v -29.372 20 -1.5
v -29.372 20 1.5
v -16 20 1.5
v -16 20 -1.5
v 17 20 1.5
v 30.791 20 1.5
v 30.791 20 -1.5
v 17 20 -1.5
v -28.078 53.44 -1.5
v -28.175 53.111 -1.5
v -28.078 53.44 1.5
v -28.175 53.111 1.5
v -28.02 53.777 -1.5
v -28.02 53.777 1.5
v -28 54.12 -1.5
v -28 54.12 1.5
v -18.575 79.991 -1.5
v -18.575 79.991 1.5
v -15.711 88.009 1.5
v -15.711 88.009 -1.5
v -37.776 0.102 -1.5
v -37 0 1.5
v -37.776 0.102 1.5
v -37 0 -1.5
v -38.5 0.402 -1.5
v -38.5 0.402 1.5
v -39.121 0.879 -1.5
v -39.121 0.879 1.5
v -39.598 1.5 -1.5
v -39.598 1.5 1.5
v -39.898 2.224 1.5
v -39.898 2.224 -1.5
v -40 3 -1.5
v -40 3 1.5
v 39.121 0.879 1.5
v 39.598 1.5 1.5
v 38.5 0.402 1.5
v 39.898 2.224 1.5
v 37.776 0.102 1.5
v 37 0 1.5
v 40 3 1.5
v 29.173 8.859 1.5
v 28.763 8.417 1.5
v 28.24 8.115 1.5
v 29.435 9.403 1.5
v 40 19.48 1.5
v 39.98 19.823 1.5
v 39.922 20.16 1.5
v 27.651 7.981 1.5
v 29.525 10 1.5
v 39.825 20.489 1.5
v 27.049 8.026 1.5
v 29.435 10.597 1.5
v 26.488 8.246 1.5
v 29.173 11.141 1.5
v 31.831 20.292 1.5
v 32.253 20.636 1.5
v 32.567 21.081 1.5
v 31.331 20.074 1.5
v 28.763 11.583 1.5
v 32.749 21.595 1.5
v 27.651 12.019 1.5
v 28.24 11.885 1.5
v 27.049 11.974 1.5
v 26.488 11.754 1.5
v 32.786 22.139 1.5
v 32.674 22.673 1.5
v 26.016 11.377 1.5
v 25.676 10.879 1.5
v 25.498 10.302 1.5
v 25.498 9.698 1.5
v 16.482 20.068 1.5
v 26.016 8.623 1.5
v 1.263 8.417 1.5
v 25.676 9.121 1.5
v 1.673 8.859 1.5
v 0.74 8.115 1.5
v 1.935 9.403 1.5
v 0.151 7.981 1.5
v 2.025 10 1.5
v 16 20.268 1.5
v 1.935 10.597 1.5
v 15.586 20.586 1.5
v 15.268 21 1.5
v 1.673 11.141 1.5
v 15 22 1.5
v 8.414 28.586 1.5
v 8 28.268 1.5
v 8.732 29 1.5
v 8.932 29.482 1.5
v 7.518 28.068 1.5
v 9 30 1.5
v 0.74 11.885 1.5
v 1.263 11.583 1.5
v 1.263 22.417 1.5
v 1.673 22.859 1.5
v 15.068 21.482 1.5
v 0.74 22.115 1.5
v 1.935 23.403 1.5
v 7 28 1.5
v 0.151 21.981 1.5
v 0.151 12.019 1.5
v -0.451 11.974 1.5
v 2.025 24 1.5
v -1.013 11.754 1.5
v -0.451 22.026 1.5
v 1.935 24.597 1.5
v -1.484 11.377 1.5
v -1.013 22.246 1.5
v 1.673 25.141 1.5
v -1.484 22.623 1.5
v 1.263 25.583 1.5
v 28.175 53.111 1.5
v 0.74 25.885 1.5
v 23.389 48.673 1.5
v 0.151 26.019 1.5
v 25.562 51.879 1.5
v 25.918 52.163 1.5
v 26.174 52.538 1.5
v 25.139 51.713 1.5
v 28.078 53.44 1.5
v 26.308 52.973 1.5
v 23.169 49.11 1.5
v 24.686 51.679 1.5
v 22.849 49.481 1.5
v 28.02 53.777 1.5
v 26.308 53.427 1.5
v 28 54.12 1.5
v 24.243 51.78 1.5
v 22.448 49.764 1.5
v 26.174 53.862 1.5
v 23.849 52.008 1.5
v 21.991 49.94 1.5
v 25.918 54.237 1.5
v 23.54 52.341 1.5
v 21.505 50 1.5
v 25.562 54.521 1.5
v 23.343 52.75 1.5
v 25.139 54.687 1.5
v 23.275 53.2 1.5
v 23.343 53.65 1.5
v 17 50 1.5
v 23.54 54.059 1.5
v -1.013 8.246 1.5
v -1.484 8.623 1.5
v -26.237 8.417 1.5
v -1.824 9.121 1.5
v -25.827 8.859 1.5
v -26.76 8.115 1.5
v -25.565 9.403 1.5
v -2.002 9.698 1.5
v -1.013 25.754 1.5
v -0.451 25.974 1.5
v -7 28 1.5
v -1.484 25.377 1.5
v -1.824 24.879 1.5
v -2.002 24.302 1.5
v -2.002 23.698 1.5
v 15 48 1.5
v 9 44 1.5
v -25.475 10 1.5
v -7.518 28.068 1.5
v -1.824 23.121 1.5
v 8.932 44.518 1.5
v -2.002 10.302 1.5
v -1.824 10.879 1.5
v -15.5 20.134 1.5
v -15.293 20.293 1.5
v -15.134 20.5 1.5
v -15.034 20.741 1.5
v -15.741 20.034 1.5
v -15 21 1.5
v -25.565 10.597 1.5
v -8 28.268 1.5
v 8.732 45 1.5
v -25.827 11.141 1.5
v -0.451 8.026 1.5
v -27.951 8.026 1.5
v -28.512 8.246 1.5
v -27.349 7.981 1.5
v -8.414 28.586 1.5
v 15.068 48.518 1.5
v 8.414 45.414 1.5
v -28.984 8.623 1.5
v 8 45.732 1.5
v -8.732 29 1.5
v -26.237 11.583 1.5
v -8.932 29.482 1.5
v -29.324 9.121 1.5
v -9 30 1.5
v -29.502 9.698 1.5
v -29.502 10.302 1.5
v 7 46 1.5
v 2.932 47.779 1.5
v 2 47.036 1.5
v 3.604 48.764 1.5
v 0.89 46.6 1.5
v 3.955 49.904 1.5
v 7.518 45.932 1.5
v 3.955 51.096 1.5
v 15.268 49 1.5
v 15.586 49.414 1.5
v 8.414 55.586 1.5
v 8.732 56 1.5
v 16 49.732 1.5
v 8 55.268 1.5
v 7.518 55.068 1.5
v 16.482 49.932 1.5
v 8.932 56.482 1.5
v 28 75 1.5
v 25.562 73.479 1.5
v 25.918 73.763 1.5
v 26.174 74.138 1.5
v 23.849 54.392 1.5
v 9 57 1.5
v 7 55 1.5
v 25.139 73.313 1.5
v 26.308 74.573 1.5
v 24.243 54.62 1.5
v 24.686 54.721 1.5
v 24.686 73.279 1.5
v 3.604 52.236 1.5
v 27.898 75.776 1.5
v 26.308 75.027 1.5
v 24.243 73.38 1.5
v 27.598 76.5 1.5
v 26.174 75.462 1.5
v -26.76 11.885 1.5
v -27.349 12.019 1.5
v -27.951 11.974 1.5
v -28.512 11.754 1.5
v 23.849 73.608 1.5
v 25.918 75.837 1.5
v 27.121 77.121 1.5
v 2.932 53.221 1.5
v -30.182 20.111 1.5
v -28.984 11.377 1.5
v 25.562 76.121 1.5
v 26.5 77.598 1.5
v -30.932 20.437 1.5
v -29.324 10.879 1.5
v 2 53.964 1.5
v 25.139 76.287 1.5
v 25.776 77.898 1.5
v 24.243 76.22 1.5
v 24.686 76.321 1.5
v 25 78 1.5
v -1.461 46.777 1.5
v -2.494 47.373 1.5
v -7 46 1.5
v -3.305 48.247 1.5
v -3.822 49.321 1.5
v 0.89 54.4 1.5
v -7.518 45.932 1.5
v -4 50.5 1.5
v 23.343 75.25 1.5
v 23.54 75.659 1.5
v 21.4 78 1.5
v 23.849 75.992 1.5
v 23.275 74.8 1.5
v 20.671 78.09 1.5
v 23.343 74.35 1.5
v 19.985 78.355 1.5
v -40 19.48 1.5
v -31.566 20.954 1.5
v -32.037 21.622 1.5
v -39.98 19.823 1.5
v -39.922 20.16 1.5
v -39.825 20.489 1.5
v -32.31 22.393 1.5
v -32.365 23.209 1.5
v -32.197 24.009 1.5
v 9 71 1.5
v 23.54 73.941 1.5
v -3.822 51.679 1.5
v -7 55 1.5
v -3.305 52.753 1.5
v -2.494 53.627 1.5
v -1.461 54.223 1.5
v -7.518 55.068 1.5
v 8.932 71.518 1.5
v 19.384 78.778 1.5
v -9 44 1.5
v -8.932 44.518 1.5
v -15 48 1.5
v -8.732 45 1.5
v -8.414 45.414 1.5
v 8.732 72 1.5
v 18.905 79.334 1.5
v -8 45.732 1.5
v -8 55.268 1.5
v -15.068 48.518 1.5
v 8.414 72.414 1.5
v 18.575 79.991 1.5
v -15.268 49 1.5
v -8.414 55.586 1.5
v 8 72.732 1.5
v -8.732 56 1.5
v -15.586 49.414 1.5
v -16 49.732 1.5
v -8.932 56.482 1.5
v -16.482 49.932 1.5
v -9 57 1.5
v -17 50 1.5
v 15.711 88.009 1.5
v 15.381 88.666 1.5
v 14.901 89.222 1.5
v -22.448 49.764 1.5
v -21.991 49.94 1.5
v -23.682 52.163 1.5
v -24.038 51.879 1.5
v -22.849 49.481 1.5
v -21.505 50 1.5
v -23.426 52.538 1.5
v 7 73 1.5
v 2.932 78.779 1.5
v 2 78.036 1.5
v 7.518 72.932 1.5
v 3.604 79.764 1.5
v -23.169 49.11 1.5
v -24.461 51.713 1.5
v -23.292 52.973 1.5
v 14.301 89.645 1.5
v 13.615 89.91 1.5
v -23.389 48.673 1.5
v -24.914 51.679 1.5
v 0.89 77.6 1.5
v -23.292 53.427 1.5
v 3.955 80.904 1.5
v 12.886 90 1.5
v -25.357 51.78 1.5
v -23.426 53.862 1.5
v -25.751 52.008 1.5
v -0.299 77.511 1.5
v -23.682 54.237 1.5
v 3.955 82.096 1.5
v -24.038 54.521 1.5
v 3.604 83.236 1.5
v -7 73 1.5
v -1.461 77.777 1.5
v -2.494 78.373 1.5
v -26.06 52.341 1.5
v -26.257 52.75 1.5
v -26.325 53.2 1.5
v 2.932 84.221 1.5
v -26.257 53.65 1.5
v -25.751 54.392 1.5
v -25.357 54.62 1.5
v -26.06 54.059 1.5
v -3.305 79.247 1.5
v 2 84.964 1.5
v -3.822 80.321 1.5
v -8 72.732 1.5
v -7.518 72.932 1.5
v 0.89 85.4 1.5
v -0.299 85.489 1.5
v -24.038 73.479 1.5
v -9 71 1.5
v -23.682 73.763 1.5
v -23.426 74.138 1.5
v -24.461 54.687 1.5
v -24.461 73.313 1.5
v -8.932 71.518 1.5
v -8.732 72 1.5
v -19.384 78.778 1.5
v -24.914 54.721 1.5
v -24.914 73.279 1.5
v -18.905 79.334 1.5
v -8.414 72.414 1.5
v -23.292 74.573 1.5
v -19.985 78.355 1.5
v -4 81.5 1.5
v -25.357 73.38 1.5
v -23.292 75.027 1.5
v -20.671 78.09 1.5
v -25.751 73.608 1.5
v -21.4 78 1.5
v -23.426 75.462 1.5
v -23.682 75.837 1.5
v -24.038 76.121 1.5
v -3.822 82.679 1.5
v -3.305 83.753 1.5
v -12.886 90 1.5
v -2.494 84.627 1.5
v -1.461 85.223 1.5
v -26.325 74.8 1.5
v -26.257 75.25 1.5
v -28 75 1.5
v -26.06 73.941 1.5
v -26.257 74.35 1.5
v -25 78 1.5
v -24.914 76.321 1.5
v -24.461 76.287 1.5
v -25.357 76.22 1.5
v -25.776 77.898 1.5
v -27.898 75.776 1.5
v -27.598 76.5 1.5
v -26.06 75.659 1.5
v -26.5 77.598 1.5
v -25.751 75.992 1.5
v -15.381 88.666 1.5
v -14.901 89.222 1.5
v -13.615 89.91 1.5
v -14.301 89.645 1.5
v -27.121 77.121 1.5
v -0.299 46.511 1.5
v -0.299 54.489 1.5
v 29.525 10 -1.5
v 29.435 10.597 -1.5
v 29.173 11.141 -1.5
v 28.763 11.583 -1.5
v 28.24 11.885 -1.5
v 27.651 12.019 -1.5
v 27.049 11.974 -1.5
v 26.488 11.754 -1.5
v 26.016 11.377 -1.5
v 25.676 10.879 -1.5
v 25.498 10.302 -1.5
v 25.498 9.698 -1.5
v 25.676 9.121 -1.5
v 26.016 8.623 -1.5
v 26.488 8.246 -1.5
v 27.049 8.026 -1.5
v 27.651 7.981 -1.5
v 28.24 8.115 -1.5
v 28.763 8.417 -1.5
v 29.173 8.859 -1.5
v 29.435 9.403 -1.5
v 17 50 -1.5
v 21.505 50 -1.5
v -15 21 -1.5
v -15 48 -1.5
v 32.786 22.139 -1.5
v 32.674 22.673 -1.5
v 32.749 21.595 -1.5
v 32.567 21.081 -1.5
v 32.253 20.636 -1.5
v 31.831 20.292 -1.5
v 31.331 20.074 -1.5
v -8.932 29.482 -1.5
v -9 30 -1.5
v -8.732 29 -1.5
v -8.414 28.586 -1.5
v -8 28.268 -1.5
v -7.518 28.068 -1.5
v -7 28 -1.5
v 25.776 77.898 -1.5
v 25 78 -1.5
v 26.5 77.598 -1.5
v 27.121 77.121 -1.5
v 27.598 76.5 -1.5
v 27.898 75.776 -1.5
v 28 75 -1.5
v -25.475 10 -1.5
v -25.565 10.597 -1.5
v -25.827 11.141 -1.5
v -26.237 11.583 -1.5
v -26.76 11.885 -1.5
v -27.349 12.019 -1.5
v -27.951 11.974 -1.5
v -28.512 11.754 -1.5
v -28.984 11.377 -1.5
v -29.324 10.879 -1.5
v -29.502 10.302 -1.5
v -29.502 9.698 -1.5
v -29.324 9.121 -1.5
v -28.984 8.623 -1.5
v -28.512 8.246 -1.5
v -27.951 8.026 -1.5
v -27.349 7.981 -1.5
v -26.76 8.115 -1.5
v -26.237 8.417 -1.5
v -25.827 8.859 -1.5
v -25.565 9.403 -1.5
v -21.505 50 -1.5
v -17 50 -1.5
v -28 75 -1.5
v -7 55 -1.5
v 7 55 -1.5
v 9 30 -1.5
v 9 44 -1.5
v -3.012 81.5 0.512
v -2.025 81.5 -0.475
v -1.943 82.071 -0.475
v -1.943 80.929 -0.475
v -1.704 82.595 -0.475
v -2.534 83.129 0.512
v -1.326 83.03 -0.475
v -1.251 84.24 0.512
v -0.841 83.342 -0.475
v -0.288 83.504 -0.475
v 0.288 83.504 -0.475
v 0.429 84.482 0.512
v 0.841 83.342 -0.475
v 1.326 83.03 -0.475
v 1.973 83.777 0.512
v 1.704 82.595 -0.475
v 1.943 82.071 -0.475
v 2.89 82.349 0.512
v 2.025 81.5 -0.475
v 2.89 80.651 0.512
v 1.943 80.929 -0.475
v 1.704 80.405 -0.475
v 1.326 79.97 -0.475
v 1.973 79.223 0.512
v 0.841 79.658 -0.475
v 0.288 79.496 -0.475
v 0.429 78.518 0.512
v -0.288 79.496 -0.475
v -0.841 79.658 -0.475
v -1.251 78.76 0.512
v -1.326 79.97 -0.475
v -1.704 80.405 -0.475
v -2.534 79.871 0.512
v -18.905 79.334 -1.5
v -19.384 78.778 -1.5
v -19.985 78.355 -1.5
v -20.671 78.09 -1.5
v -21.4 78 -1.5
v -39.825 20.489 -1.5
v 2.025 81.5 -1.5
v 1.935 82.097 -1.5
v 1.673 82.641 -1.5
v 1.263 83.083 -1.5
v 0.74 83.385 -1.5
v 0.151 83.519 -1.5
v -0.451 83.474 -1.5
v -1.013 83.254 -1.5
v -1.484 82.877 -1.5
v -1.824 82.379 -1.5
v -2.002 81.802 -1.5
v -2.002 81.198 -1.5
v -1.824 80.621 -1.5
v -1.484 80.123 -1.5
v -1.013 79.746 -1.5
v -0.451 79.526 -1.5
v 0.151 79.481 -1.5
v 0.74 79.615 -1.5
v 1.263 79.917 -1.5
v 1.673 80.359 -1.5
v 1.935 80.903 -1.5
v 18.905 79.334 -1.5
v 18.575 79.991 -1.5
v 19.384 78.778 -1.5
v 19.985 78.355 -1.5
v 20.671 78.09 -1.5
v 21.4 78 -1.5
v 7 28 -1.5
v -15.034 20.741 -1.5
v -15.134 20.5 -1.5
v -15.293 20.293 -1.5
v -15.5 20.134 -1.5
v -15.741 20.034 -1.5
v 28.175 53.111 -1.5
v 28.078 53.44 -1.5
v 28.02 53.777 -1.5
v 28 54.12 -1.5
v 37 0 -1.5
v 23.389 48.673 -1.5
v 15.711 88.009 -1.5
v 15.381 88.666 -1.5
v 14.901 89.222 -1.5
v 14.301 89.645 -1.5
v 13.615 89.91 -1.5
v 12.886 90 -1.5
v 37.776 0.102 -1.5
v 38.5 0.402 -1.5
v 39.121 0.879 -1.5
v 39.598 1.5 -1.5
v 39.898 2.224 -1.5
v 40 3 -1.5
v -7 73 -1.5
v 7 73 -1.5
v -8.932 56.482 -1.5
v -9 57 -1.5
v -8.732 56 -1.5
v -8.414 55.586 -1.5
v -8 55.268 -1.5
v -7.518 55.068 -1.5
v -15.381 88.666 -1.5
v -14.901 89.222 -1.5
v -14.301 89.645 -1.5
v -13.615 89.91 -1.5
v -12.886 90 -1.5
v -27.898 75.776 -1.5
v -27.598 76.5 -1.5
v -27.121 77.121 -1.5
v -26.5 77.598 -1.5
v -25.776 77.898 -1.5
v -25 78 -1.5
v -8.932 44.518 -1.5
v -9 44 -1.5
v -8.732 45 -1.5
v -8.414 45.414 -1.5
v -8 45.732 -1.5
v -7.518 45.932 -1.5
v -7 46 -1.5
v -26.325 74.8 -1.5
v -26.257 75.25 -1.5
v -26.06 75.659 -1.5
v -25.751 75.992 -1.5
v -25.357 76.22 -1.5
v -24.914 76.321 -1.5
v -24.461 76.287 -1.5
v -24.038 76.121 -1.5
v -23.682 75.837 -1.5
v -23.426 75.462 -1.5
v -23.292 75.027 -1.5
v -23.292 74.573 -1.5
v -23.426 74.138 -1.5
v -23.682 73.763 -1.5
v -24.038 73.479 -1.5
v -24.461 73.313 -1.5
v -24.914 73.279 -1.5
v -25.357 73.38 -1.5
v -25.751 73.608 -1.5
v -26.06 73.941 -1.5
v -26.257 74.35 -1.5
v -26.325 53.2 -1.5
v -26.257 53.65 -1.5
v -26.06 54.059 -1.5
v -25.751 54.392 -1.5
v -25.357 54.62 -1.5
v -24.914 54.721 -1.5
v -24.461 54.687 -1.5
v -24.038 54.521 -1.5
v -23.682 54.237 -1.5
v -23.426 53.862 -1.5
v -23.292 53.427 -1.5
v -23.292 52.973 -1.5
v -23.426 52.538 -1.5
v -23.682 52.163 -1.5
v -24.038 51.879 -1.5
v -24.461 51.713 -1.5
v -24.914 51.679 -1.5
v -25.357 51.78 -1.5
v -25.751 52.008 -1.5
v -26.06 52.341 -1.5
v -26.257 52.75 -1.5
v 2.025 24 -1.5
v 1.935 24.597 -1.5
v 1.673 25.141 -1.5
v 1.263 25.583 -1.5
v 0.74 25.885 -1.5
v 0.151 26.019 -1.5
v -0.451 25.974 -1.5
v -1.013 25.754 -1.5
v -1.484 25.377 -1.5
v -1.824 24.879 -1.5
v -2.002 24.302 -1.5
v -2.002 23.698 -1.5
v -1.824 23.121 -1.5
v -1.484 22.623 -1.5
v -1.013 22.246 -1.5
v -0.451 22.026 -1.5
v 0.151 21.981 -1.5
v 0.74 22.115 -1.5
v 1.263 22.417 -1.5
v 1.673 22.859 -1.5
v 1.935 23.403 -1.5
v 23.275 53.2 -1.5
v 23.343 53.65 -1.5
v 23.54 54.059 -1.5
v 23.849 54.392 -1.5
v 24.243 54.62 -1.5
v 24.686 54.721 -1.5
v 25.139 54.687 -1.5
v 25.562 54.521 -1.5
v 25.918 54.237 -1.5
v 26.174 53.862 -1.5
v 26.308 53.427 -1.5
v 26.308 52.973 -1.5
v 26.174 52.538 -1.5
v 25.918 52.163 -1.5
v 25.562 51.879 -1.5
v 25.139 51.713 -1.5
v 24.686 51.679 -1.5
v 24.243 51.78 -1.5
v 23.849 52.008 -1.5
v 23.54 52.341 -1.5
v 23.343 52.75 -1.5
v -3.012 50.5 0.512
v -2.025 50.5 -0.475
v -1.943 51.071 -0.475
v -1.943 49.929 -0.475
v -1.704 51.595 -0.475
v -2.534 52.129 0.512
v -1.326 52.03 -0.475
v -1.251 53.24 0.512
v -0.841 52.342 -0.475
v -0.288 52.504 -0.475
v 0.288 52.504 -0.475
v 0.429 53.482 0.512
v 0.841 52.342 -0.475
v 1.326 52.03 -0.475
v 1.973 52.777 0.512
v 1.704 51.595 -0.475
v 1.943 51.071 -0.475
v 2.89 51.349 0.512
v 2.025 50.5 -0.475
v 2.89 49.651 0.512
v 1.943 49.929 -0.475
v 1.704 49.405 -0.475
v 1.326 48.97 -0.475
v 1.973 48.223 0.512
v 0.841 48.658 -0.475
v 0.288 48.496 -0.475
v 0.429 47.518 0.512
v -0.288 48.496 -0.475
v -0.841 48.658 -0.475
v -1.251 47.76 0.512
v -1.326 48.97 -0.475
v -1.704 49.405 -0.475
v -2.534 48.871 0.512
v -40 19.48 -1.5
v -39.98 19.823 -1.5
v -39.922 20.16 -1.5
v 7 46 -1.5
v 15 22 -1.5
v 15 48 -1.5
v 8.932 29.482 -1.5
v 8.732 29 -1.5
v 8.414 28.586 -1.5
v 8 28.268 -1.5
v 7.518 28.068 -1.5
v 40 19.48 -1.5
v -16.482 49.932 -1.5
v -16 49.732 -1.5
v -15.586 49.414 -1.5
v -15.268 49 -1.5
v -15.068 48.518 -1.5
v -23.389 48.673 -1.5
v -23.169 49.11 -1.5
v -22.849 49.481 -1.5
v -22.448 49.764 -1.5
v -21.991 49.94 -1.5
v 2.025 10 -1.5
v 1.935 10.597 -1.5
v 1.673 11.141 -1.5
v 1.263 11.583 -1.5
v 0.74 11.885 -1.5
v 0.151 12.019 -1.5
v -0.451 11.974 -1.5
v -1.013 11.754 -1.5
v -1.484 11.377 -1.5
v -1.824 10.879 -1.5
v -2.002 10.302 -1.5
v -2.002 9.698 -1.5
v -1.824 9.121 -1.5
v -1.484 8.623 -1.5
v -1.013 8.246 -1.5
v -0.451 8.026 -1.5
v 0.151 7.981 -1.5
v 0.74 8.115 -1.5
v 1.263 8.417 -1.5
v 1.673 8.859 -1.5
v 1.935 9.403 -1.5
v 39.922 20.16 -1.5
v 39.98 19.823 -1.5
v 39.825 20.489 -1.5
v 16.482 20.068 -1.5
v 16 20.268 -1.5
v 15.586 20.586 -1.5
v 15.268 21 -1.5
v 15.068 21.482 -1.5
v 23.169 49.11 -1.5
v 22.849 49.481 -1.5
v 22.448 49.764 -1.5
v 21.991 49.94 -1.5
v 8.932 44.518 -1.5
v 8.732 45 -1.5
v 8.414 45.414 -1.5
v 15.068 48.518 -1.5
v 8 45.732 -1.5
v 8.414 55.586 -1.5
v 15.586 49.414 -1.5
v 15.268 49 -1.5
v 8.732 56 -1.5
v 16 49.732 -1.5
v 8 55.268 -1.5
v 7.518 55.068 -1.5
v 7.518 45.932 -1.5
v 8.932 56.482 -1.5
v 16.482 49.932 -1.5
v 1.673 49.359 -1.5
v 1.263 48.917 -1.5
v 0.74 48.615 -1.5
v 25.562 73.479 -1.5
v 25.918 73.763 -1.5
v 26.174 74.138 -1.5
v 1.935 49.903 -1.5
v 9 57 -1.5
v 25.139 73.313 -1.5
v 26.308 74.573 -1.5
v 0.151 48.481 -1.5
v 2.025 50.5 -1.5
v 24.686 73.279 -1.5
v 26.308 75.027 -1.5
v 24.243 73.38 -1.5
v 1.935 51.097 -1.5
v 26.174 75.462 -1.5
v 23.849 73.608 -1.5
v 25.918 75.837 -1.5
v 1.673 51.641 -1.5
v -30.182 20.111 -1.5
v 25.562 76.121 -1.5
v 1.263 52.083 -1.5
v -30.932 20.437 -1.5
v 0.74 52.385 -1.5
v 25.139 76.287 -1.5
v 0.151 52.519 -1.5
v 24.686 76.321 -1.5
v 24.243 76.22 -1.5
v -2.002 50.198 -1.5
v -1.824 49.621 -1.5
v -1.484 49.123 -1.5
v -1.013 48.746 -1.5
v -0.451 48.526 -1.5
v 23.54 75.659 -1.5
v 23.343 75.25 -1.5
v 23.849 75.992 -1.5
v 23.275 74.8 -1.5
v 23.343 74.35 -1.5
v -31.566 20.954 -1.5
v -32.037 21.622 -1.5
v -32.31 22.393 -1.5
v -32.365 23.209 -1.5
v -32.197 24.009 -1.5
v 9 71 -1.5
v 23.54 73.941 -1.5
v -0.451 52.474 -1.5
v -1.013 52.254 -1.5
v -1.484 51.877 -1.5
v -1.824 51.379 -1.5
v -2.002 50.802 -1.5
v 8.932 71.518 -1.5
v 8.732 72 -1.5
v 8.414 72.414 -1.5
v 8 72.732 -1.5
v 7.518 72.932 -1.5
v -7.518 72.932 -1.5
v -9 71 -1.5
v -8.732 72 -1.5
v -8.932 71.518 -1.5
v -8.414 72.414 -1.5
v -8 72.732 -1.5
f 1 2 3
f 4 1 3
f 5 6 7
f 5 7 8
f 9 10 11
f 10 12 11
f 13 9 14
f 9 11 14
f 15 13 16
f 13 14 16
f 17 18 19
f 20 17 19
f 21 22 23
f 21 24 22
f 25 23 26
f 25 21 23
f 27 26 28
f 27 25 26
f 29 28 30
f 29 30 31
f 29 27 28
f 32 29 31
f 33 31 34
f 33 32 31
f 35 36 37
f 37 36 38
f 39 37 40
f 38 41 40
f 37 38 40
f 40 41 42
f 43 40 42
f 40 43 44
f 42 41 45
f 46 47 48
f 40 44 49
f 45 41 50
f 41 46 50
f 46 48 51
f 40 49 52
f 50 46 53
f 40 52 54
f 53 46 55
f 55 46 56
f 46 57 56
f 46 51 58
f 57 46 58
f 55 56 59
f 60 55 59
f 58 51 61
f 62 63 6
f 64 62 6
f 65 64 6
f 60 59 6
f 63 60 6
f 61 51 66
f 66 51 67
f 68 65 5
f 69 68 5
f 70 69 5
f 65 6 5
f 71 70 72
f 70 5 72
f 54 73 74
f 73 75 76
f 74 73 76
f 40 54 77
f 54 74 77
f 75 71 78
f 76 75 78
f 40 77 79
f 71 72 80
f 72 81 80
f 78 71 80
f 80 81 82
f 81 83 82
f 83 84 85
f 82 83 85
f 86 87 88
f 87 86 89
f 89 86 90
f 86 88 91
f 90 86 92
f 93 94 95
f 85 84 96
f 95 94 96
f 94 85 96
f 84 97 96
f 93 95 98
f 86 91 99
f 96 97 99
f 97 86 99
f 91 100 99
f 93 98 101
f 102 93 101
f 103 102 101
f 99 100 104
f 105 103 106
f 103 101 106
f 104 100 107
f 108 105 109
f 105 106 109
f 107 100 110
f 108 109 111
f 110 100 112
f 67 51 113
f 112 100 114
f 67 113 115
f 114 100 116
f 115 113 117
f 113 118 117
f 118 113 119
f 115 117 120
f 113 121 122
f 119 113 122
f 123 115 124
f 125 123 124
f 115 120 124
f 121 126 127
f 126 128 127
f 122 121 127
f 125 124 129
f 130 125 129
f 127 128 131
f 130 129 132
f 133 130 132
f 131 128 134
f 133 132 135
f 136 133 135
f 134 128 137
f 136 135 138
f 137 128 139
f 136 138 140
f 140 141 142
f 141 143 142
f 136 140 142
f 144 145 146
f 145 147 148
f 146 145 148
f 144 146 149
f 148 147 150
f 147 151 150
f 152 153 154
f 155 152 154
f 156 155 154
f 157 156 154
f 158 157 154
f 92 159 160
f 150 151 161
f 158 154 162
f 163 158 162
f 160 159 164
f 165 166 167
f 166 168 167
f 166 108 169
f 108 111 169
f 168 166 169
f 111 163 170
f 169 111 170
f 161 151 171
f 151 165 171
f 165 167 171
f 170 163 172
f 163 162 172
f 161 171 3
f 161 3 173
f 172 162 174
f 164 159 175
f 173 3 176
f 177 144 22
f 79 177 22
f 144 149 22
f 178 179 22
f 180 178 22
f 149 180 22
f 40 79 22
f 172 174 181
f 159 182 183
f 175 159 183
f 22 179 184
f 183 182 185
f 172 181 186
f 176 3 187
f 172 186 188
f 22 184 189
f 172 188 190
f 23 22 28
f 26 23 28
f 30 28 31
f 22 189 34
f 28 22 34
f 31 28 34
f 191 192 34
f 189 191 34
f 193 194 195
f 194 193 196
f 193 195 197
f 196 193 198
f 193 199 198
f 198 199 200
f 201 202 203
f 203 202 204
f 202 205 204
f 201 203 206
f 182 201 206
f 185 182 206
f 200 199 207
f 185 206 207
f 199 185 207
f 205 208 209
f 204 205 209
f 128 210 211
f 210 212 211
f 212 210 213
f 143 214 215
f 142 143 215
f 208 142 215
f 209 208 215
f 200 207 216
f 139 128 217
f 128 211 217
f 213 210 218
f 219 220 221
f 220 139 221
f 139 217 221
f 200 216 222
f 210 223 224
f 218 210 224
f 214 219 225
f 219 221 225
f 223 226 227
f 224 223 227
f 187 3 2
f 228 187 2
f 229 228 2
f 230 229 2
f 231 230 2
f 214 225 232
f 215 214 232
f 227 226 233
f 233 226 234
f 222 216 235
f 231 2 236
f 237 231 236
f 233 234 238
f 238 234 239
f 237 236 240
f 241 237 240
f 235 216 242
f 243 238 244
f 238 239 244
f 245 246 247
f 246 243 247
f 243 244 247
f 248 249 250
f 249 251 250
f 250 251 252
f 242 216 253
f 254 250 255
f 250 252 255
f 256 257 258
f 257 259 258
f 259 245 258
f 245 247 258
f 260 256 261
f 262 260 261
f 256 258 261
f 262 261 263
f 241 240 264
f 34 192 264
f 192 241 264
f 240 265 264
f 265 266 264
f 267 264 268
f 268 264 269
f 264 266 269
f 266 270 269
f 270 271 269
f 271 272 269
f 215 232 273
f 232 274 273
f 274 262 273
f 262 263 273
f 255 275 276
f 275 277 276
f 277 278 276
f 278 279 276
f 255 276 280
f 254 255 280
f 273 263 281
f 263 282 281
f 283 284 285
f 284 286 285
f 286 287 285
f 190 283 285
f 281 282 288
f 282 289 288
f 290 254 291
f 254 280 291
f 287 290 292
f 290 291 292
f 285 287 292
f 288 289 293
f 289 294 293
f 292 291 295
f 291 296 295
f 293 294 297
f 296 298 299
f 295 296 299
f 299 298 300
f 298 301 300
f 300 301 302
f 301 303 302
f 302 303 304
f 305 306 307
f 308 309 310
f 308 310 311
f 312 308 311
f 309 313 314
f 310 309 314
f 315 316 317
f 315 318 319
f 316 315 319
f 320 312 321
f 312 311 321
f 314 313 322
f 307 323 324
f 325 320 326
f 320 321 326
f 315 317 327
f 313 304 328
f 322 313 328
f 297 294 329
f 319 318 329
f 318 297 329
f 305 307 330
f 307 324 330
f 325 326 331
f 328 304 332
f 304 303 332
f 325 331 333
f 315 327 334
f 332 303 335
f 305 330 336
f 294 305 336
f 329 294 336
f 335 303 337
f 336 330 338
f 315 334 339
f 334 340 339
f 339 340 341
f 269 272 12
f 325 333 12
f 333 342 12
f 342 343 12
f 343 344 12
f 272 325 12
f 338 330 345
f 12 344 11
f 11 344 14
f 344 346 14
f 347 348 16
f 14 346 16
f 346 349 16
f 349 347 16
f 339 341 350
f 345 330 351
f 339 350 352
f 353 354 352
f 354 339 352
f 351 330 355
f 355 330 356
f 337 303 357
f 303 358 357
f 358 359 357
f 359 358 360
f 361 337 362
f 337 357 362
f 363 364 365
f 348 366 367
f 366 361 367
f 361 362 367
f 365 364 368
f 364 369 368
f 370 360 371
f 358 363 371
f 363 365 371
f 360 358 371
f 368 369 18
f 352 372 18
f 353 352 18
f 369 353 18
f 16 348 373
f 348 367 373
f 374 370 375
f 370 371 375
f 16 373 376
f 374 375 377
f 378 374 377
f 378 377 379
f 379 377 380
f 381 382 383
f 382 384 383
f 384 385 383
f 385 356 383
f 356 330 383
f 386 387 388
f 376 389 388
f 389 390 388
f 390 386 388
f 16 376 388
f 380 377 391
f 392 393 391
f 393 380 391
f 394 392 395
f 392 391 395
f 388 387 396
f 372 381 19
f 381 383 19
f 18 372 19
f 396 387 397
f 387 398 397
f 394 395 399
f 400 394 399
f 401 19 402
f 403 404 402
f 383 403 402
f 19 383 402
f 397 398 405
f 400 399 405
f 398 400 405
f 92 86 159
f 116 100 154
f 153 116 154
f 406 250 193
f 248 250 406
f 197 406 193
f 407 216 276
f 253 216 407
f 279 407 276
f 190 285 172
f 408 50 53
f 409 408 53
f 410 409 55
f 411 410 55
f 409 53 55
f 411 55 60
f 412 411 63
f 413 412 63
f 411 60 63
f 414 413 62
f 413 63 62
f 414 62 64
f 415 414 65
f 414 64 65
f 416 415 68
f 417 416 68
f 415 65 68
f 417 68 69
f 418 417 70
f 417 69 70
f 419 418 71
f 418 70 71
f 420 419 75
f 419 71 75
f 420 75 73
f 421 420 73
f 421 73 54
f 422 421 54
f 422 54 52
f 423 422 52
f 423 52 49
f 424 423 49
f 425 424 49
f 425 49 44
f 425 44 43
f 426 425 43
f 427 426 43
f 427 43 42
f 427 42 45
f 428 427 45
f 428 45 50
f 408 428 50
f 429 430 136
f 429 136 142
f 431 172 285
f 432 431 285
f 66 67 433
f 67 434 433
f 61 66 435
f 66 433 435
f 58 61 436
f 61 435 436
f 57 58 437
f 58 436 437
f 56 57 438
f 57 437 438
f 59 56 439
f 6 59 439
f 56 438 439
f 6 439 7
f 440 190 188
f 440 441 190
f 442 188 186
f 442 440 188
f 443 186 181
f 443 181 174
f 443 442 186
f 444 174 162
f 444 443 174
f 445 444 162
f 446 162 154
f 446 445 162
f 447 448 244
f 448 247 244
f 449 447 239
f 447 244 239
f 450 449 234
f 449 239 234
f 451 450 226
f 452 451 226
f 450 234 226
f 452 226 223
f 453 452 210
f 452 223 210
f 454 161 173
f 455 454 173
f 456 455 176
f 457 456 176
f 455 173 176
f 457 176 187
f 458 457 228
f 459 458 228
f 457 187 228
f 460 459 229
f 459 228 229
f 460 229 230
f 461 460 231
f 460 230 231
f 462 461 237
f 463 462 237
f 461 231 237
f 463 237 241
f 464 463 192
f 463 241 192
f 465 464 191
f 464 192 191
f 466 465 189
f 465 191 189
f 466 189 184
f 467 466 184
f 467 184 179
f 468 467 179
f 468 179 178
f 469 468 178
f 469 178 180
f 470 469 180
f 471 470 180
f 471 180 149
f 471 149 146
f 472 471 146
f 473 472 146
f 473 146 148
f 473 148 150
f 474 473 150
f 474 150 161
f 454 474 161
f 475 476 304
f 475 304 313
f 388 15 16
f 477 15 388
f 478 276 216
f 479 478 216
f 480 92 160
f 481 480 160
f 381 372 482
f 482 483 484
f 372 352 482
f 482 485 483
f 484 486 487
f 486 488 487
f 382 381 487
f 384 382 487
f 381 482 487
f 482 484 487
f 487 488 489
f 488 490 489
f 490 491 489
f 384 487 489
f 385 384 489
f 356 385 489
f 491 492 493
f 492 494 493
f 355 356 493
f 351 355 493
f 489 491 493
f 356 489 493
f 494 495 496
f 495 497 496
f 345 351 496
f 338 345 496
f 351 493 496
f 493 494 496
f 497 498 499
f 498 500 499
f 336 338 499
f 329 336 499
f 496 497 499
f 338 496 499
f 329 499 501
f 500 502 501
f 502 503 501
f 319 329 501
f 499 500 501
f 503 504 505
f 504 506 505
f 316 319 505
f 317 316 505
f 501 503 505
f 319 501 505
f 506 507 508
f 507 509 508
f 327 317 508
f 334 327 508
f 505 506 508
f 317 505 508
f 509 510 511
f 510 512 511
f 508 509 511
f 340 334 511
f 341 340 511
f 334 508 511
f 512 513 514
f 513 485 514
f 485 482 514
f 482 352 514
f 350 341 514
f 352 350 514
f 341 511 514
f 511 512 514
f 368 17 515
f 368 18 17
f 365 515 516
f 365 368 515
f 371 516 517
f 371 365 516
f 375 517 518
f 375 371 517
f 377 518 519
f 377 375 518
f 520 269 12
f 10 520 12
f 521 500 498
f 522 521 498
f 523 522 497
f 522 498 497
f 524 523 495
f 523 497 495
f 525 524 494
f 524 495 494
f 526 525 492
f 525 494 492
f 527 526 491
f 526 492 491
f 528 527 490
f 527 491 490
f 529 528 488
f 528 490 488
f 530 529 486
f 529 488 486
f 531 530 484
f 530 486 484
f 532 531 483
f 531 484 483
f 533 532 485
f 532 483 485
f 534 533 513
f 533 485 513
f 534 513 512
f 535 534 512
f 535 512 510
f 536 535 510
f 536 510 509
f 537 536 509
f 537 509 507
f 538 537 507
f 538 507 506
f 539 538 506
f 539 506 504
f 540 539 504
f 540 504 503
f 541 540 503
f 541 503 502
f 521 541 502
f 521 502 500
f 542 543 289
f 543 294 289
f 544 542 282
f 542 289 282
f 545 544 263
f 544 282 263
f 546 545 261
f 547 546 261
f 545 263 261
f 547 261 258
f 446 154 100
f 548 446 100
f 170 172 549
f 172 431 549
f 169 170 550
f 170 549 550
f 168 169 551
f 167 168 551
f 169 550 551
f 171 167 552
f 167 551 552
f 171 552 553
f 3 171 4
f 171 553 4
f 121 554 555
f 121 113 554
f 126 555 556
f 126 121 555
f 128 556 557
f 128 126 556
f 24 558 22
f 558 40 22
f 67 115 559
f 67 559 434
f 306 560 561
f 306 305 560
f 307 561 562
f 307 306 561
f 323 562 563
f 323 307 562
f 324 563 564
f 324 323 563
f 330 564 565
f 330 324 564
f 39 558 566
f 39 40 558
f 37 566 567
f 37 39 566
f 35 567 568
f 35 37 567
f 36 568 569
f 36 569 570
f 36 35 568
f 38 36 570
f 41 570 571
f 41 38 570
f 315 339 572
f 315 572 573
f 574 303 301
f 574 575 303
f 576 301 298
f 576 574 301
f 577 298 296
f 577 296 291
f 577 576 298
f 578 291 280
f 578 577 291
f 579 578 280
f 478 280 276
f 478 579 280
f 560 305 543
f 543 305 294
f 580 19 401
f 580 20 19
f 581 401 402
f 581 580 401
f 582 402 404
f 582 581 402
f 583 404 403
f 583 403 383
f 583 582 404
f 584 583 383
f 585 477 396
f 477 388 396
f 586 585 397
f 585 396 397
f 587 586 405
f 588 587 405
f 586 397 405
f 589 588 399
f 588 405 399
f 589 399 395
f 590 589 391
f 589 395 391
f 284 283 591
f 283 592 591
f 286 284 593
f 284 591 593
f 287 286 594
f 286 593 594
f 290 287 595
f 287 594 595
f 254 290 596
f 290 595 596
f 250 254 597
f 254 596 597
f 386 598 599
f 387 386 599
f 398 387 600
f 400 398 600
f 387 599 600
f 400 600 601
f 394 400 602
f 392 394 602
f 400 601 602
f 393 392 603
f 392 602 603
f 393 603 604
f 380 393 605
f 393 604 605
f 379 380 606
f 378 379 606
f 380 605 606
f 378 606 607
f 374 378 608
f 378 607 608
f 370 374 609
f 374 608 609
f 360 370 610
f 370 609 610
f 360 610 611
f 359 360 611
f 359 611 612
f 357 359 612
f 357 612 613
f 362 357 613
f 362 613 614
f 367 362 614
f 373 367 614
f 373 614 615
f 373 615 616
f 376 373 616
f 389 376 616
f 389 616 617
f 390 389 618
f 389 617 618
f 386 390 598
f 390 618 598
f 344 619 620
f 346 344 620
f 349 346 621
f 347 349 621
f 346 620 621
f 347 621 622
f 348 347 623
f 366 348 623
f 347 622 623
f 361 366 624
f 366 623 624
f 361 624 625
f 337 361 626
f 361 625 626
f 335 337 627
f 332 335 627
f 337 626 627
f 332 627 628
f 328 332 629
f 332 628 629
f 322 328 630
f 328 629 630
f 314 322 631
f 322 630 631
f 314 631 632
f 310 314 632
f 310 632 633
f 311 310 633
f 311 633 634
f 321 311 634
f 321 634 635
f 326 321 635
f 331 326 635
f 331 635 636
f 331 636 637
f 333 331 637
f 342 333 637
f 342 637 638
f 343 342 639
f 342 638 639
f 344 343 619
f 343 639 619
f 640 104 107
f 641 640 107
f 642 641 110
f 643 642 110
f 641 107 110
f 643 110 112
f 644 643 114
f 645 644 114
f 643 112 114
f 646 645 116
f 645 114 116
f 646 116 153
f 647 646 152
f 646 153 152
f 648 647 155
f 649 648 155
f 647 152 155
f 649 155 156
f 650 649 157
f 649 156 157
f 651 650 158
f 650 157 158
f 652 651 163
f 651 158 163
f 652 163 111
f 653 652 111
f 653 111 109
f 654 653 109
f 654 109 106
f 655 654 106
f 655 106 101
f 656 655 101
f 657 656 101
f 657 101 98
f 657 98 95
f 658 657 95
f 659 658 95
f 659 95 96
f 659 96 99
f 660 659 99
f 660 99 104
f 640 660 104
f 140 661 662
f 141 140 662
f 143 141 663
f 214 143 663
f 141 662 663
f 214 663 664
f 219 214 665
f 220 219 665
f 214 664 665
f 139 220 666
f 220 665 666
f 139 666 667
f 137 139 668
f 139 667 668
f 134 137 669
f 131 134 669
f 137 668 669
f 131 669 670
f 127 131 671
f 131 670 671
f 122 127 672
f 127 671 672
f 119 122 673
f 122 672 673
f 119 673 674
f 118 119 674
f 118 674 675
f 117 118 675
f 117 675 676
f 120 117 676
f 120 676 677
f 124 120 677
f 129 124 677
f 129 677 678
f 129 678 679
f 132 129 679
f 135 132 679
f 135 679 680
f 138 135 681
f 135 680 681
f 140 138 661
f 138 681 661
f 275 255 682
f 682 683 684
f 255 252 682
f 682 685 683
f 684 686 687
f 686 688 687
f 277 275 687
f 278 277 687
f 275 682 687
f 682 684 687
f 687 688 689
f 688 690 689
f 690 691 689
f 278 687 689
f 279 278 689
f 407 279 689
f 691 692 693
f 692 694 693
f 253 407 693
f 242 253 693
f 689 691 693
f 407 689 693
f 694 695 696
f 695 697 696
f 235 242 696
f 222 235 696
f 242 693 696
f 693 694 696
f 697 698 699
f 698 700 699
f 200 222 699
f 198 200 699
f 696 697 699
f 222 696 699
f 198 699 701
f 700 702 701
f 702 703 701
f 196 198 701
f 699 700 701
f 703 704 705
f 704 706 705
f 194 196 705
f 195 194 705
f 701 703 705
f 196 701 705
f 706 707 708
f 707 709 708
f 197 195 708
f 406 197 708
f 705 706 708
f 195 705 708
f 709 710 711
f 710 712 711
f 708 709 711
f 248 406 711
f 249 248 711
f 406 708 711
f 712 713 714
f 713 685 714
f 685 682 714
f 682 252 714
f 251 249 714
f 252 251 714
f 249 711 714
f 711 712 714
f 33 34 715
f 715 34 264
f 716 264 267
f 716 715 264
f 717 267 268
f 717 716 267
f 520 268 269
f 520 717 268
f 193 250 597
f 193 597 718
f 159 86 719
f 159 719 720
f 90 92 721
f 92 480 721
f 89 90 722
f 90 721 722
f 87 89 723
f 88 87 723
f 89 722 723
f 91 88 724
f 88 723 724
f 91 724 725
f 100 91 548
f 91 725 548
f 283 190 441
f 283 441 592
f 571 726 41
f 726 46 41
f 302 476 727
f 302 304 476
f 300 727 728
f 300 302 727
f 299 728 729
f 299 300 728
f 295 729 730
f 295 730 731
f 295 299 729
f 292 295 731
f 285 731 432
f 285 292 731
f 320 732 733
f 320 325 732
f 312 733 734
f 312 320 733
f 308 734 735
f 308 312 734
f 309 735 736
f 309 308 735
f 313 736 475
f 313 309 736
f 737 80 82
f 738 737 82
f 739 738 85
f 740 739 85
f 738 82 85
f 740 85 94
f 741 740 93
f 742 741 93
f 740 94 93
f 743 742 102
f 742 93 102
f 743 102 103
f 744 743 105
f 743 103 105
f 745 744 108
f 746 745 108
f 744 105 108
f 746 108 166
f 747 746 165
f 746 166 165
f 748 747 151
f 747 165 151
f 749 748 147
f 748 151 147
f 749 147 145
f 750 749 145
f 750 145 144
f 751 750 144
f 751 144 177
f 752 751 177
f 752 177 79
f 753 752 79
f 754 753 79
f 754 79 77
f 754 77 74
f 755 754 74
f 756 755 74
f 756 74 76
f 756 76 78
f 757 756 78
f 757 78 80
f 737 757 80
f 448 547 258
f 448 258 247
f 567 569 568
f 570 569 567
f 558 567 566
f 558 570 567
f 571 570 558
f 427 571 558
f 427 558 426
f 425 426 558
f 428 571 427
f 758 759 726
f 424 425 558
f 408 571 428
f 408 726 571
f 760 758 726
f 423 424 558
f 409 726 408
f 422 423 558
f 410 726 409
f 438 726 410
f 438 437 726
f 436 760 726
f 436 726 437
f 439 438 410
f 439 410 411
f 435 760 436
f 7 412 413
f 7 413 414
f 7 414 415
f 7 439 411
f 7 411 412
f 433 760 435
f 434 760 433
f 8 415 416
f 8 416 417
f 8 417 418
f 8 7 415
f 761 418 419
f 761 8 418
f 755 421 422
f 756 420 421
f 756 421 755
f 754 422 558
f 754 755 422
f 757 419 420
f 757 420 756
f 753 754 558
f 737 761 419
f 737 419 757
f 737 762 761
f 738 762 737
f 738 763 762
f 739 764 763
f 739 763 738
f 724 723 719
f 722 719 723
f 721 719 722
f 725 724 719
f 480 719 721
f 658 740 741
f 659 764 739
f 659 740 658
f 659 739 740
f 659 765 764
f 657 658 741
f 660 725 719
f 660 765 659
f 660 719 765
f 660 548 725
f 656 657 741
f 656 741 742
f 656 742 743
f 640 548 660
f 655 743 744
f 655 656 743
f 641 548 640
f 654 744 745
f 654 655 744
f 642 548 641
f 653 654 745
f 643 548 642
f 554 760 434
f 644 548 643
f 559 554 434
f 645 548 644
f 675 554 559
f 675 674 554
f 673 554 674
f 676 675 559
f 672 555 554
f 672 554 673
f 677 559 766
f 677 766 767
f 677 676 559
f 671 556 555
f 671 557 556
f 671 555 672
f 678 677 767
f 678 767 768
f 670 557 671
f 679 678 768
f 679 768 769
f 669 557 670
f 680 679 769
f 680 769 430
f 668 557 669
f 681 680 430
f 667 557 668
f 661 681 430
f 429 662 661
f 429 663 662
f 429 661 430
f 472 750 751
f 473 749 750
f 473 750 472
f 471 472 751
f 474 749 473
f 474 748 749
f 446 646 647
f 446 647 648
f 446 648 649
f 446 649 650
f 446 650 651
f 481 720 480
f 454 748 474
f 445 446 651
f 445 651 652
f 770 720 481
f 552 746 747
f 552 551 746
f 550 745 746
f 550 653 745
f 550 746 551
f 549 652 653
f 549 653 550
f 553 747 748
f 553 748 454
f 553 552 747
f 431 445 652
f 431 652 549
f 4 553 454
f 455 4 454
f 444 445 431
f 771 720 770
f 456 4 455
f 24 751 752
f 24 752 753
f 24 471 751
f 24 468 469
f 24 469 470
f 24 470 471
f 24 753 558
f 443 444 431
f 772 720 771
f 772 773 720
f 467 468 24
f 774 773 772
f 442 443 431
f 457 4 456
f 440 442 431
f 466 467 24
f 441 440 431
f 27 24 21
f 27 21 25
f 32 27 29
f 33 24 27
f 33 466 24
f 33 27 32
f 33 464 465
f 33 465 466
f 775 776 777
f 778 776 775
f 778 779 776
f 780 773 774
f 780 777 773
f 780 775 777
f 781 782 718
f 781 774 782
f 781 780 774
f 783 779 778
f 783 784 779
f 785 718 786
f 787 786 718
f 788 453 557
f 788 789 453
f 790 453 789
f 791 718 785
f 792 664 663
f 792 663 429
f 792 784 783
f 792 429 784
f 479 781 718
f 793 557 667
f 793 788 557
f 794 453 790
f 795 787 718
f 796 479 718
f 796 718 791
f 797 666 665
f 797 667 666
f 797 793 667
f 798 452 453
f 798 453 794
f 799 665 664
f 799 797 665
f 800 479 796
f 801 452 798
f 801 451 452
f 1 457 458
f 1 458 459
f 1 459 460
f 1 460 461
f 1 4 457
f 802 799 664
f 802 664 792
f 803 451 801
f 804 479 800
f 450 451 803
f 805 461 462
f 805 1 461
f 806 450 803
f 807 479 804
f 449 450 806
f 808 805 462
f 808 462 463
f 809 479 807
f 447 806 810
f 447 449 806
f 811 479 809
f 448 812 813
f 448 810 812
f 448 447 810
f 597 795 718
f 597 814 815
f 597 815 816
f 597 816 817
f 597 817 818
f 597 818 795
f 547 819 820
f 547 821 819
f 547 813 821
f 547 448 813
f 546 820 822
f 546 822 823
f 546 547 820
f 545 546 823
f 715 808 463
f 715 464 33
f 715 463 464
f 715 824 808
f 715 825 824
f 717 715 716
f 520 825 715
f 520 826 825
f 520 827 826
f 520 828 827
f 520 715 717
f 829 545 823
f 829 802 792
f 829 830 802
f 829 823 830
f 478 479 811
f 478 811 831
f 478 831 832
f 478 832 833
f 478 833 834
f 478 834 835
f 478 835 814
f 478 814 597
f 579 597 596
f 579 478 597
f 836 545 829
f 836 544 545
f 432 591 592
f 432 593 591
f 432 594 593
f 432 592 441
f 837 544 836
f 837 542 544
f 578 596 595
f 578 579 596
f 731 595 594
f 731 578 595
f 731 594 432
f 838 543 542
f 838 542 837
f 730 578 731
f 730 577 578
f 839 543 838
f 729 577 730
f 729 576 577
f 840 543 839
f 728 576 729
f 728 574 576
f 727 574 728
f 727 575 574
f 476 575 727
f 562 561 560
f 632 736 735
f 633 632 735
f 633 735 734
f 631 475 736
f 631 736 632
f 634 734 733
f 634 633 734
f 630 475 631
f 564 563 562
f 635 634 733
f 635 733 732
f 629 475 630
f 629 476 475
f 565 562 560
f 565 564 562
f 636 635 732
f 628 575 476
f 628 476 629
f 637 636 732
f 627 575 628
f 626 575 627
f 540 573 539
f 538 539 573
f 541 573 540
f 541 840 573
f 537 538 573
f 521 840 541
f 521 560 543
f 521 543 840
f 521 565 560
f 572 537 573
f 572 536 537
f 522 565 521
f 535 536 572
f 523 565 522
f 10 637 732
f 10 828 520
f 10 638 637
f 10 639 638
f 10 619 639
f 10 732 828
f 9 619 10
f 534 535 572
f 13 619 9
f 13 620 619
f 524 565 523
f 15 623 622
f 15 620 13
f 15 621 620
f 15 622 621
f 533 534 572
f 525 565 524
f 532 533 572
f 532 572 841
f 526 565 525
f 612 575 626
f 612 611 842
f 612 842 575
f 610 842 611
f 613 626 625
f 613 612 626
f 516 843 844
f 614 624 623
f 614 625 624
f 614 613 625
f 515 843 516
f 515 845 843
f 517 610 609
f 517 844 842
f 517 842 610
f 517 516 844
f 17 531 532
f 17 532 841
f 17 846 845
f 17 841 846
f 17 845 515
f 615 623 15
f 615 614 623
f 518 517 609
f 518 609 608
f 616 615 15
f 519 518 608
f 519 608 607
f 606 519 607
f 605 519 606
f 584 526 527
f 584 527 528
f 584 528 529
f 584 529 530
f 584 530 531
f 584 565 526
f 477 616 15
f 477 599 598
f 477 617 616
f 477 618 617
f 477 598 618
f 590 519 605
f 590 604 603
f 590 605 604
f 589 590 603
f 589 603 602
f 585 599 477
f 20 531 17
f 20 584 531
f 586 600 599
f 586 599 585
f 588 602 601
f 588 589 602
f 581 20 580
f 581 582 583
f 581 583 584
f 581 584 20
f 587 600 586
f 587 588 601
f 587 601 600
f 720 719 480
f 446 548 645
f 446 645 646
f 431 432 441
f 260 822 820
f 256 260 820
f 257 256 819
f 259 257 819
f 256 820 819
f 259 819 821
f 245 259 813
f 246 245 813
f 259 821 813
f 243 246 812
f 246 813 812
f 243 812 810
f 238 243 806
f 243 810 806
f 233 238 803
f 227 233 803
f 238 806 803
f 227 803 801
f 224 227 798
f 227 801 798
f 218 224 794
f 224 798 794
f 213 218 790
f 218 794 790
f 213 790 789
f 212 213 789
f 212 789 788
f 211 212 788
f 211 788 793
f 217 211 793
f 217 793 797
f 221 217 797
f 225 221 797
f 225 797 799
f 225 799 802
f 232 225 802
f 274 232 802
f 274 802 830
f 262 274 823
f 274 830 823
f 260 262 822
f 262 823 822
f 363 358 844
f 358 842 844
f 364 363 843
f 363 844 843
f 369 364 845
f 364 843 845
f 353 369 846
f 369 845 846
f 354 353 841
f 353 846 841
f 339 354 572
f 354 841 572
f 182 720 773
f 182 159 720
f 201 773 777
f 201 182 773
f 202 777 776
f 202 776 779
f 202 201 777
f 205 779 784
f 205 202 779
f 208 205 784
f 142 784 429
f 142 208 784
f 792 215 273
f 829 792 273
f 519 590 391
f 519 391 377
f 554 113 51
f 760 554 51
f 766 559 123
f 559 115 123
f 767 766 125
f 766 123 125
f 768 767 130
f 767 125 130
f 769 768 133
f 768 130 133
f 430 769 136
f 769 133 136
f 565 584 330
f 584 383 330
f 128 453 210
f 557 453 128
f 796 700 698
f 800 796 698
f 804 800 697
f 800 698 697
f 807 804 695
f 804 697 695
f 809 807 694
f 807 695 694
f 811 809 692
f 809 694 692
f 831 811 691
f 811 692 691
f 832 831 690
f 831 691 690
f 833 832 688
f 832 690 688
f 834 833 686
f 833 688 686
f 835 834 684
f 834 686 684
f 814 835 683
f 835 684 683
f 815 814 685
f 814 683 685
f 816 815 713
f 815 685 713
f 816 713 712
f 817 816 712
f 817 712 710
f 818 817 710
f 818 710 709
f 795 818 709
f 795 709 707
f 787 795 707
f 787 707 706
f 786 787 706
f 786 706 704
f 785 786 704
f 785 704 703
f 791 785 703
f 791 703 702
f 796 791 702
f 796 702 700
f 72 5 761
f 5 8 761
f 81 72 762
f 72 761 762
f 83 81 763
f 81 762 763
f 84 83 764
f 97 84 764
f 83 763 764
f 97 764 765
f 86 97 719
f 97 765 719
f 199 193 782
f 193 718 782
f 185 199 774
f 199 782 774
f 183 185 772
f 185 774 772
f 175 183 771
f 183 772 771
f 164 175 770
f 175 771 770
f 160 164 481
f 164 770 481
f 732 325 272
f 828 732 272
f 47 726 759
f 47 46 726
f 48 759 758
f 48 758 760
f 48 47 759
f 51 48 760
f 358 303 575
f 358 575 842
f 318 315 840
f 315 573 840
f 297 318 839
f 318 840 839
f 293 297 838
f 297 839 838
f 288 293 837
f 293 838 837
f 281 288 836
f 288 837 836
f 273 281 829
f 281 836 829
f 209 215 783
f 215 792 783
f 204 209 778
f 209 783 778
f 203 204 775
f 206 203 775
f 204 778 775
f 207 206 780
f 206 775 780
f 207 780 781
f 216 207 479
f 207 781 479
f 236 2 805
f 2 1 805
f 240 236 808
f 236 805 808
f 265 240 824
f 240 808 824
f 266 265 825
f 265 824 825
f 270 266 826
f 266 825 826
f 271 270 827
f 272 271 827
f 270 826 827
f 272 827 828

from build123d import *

# Parameters (mm, degrees)
EXTRUDE_1_DEPTH           = 1.5
SKETCH_2_W                = 18
SKETCH_2_H                = 18
CUT_EXTRUDE_1_DEPTH       = 3
FILLET_1_R                = 1
FILLET_2_R                = 2
FILLET_3_R                = 3
SKETCH_3_R                = 2.025
CUT_EXTRUDE_2_DEPTH       = 1
CUT_EXTRUDE_2_DEPTH_BACK  = 4
SKETCH_4_R                = 2.025
CUT_EXTRUDE_3_DEPTH       = 1
CUT_EXTRUDE_3_DEPTH_BACK  = 4
SKETCH_5_R                = 2.025
CUT_EXTRUDE_4_DEPTH       = 1
CUT_EXTRUDE_4_DEPTH_BACK  = 4
FILLET_4_R                = 3
EXTRUDE_2_DEPTH           = 3
FILLET_5_R                = 3
SKETCH_7_R                = 1.525
CUT_EXTRUDE_5_DEPTH       = 3
HOLE_WIZARD_1_D           = 4.05
HOLE_WIZARD_1_DEPTH       = 100
HOLE_WIZARD_1_CSINK_D     = 8
HOLE_WIZARD_1_CSINK_ANGLE = 90
FILLET_6_R                = 2


with BuildPart() as part:
    # 草图1 → 凸台-拉伸1 (new body, symmetric)
    with BuildSketch(Plane.XY):
        Polygon((40, 0), (-40, 0), (-40, 20), (-15, 90), (15, 90), (40, 20), align=None)
    extrude(amount=EXTRUDE_1_DEPTH, both=True)

    # 草图2 → 切除-拉伸1 (cut)
    with BuildSketch(Plane.XY.offset(1.5)):
        Polygon((-15, 72.160717503), (-33.62882768, 20), (-15, 20), align=None)
        with Locations((0, 64)):
            Rectangle(SKETCH_2_W, SKETCH_2_H)
        with Locations((0, 37)):
            Rectangle(SKETCH_2_W, SKETCH_2_H)
        Polygon((15, 20), (15, 72.160717503), (33.62882768, 20), align=None)
    extrude(amount=-CUT_EXTRUDE_1_DEPTH, mode=Mode.SUBTRACT)

    # 圆角1
    fillet_1_edges = [part.edges().sort_by_distance(p)[0] for p in [
        (-15, 20, 0),
        (-15, 72.160717503, 0),
    ]]
    fillet(fillet_1_edges, radius=FILLET_1_R)

    # 圆角2
    fillet_2_edges = [part.edges().sort_by_distance(p)[0] for p in [
        (-9, 46, 0),
        (-9, 28, 0),
        (9, 28, 0),
        (9, 46, 0),
        (-9, 73, 0),
        (-9, 55, 0),
        (9, 55, 0),
        (9, 73, 0),
    ]]
    fillet(fillet_2_edges, radius=FILLET_2_R)

    # 圆角3
    fillet_3_edges = [part.edges().sort_by_distance(p)[0] for p in [
        (40, 0, 0),
        (-40, 0, 0),
        (-40, 20, 0),
        (-15, 90, 0),
        (15, 90, 0),
        (40, 20, 0),
    ]]
    fillet(fillet_3_edges, radius=FILLET_3_R)

    # 草图3 → 切除-拉伸2 (cut, two sides)
    with BuildSketch(Plane.XY.offset(1.5)) as cut_extrude_2_sk:
        with Locations((-27.5, 10)):
            Circle(SKETCH_3_R)
        with Locations((27.5, 10)):
            Circle(SKETCH_3_R)
    extrude(amount=CUT_EXTRUDE_2_DEPTH, mode=Mode.SUBTRACT)
    extrude(cut_extrude_2_sk.sketch, amount=-CUT_EXTRUDE_2_DEPTH_BACK, mode=Mode.SUBTRACT)

    # 草图4 → 切除-拉伸3 (cut, two sides)
    with BuildSketch(Plane.XY.offset(1.5)) as cut_extrude_3_sk:
        with Locations((0, 10)):
            Circle(SKETCH_4_R)
    extrude(amount=CUT_EXTRUDE_3_DEPTH, mode=Mode.SUBTRACT)
    extrude(cut_extrude_3_sk.sketch, amount=-CUT_EXTRUDE_3_DEPTH_BACK, mode=Mode.SUBTRACT)

    # 草图5 → 切除-拉伸4 (cut, two sides)
    with BuildSketch(Plane.XY.offset(1.5)) as cut_extrude_4_sk:
        with Locations((0, 24)):
            Circle(SKETCH_5_R)
        with Locations((0, 50.5)):
            Circle(SKETCH_5_R)
        with Locations((0, 81.5)):
            Circle(SKETCH_5_R)
    extrude(amount=CUT_EXTRUDE_4_DEPTH, mode=Mode.SUBTRACT)
    extrude(cut_extrude_4_sk.sketch, amount=-CUT_EXTRUDE_4_DEPTH_BACK, mode=Mode.SUBTRACT)

    # 圆角4
    fillet_4_edges = [part.edges().sort_by_distance(p)[0] for p in [
        (-33.62882768, 20, 0),
    ]]
    fillet(fillet_4_edges, radius=FILLET_4_R)

    # 草图6 → 凸台-拉伸2 (add)
    with BuildSketch(Plane(origin=(0, 0, -1.5), x_dir=(-1, 0, 0), z_dir=(0, 0, -1))):
        Polygon((-28, 78), (-28, 53.6), (-19.285714286, 78), align=None)
        Polygon((28, 78), (19.285714286, 78), (28, 53.6), align=None)
        Polygon((-15, 72.160717503), (-22.914541965, 50), (-15, 50), align=None)
        with BuildLine():
            Line((15, 66.387503754), (15, 50))
            Line((15, 50), (22.914541965, 50))
            Line((22.914541965, 50), (16.941741912, 66.723840151))
            ThreePointArc((16.941741912, 66.723840151), (15.82932767, 67.372831596), (15, 66.387503754))
        make_face()
    extrude(amount=-EXTRUDE_2_DEPTH)

    # 圆角5
    fillet_5_edges = [part.edges().sort_by_distance(p)[0] for p in [
        (28, 78, 0),
        (19.285714286, 78, 0),
        (28, 53.6, 0),
        (-28, 78, 0),
        (-19.285714286, 78, 0),
        (-28, 53.6, 0),
    ]]
    fillet(fillet_5_edges, radius=FILLET_5_R)

    # 草图7 → 切除-拉伸5 (cut)
    with BuildSketch(Plane(origin=(0, 0, -1.5), x_dir=(-1, 0, 0), z_dir=(0, 0, -1))):
        with Locations((24.8, 74.8)):
            Circle(SKETCH_7_R)
        with Locations((24.8, 53.2)):
            Circle(SKETCH_7_R)
        with Locations((-24.8, 53.2)):
            Circle(SKETCH_7_R)
        with Locations((-24.8, 74.8)):
            Circle(SKETCH_7_R)
    extrude(amount=-CUT_EXTRUDE_5_DEPTH, mode=Mode.SUBTRACT)

    # 孔1
    with Locations(Plane.XY.offset(1.5)):
        with Locations((0, 81.5), (0, 50.5)):
            CounterSinkHole(HOLE_WIZARD_1_D / 2, HOLE_WIZARD_1_CSINK_D / 2, depth=HOLE_WIZARD_1_DEPTH, counter_sink_angle=HOLE_WIZARD_1_CSINK_ANGLE)

    # 圆角6
    fillet_6_edges = [part.edges().sort_by_distance(p)[0] for p in [
        (15, 50, 0),
        (22.914541965, 50, 0),
        (-22.914541965, 50, 0),
        (-15, 50, 0),
        (15, 20, 0),
        (33.62882768, 20, 0),
    ]]
    fillet(fillet_6_edges, radius=FILLET_6_R)


solid = part.part
